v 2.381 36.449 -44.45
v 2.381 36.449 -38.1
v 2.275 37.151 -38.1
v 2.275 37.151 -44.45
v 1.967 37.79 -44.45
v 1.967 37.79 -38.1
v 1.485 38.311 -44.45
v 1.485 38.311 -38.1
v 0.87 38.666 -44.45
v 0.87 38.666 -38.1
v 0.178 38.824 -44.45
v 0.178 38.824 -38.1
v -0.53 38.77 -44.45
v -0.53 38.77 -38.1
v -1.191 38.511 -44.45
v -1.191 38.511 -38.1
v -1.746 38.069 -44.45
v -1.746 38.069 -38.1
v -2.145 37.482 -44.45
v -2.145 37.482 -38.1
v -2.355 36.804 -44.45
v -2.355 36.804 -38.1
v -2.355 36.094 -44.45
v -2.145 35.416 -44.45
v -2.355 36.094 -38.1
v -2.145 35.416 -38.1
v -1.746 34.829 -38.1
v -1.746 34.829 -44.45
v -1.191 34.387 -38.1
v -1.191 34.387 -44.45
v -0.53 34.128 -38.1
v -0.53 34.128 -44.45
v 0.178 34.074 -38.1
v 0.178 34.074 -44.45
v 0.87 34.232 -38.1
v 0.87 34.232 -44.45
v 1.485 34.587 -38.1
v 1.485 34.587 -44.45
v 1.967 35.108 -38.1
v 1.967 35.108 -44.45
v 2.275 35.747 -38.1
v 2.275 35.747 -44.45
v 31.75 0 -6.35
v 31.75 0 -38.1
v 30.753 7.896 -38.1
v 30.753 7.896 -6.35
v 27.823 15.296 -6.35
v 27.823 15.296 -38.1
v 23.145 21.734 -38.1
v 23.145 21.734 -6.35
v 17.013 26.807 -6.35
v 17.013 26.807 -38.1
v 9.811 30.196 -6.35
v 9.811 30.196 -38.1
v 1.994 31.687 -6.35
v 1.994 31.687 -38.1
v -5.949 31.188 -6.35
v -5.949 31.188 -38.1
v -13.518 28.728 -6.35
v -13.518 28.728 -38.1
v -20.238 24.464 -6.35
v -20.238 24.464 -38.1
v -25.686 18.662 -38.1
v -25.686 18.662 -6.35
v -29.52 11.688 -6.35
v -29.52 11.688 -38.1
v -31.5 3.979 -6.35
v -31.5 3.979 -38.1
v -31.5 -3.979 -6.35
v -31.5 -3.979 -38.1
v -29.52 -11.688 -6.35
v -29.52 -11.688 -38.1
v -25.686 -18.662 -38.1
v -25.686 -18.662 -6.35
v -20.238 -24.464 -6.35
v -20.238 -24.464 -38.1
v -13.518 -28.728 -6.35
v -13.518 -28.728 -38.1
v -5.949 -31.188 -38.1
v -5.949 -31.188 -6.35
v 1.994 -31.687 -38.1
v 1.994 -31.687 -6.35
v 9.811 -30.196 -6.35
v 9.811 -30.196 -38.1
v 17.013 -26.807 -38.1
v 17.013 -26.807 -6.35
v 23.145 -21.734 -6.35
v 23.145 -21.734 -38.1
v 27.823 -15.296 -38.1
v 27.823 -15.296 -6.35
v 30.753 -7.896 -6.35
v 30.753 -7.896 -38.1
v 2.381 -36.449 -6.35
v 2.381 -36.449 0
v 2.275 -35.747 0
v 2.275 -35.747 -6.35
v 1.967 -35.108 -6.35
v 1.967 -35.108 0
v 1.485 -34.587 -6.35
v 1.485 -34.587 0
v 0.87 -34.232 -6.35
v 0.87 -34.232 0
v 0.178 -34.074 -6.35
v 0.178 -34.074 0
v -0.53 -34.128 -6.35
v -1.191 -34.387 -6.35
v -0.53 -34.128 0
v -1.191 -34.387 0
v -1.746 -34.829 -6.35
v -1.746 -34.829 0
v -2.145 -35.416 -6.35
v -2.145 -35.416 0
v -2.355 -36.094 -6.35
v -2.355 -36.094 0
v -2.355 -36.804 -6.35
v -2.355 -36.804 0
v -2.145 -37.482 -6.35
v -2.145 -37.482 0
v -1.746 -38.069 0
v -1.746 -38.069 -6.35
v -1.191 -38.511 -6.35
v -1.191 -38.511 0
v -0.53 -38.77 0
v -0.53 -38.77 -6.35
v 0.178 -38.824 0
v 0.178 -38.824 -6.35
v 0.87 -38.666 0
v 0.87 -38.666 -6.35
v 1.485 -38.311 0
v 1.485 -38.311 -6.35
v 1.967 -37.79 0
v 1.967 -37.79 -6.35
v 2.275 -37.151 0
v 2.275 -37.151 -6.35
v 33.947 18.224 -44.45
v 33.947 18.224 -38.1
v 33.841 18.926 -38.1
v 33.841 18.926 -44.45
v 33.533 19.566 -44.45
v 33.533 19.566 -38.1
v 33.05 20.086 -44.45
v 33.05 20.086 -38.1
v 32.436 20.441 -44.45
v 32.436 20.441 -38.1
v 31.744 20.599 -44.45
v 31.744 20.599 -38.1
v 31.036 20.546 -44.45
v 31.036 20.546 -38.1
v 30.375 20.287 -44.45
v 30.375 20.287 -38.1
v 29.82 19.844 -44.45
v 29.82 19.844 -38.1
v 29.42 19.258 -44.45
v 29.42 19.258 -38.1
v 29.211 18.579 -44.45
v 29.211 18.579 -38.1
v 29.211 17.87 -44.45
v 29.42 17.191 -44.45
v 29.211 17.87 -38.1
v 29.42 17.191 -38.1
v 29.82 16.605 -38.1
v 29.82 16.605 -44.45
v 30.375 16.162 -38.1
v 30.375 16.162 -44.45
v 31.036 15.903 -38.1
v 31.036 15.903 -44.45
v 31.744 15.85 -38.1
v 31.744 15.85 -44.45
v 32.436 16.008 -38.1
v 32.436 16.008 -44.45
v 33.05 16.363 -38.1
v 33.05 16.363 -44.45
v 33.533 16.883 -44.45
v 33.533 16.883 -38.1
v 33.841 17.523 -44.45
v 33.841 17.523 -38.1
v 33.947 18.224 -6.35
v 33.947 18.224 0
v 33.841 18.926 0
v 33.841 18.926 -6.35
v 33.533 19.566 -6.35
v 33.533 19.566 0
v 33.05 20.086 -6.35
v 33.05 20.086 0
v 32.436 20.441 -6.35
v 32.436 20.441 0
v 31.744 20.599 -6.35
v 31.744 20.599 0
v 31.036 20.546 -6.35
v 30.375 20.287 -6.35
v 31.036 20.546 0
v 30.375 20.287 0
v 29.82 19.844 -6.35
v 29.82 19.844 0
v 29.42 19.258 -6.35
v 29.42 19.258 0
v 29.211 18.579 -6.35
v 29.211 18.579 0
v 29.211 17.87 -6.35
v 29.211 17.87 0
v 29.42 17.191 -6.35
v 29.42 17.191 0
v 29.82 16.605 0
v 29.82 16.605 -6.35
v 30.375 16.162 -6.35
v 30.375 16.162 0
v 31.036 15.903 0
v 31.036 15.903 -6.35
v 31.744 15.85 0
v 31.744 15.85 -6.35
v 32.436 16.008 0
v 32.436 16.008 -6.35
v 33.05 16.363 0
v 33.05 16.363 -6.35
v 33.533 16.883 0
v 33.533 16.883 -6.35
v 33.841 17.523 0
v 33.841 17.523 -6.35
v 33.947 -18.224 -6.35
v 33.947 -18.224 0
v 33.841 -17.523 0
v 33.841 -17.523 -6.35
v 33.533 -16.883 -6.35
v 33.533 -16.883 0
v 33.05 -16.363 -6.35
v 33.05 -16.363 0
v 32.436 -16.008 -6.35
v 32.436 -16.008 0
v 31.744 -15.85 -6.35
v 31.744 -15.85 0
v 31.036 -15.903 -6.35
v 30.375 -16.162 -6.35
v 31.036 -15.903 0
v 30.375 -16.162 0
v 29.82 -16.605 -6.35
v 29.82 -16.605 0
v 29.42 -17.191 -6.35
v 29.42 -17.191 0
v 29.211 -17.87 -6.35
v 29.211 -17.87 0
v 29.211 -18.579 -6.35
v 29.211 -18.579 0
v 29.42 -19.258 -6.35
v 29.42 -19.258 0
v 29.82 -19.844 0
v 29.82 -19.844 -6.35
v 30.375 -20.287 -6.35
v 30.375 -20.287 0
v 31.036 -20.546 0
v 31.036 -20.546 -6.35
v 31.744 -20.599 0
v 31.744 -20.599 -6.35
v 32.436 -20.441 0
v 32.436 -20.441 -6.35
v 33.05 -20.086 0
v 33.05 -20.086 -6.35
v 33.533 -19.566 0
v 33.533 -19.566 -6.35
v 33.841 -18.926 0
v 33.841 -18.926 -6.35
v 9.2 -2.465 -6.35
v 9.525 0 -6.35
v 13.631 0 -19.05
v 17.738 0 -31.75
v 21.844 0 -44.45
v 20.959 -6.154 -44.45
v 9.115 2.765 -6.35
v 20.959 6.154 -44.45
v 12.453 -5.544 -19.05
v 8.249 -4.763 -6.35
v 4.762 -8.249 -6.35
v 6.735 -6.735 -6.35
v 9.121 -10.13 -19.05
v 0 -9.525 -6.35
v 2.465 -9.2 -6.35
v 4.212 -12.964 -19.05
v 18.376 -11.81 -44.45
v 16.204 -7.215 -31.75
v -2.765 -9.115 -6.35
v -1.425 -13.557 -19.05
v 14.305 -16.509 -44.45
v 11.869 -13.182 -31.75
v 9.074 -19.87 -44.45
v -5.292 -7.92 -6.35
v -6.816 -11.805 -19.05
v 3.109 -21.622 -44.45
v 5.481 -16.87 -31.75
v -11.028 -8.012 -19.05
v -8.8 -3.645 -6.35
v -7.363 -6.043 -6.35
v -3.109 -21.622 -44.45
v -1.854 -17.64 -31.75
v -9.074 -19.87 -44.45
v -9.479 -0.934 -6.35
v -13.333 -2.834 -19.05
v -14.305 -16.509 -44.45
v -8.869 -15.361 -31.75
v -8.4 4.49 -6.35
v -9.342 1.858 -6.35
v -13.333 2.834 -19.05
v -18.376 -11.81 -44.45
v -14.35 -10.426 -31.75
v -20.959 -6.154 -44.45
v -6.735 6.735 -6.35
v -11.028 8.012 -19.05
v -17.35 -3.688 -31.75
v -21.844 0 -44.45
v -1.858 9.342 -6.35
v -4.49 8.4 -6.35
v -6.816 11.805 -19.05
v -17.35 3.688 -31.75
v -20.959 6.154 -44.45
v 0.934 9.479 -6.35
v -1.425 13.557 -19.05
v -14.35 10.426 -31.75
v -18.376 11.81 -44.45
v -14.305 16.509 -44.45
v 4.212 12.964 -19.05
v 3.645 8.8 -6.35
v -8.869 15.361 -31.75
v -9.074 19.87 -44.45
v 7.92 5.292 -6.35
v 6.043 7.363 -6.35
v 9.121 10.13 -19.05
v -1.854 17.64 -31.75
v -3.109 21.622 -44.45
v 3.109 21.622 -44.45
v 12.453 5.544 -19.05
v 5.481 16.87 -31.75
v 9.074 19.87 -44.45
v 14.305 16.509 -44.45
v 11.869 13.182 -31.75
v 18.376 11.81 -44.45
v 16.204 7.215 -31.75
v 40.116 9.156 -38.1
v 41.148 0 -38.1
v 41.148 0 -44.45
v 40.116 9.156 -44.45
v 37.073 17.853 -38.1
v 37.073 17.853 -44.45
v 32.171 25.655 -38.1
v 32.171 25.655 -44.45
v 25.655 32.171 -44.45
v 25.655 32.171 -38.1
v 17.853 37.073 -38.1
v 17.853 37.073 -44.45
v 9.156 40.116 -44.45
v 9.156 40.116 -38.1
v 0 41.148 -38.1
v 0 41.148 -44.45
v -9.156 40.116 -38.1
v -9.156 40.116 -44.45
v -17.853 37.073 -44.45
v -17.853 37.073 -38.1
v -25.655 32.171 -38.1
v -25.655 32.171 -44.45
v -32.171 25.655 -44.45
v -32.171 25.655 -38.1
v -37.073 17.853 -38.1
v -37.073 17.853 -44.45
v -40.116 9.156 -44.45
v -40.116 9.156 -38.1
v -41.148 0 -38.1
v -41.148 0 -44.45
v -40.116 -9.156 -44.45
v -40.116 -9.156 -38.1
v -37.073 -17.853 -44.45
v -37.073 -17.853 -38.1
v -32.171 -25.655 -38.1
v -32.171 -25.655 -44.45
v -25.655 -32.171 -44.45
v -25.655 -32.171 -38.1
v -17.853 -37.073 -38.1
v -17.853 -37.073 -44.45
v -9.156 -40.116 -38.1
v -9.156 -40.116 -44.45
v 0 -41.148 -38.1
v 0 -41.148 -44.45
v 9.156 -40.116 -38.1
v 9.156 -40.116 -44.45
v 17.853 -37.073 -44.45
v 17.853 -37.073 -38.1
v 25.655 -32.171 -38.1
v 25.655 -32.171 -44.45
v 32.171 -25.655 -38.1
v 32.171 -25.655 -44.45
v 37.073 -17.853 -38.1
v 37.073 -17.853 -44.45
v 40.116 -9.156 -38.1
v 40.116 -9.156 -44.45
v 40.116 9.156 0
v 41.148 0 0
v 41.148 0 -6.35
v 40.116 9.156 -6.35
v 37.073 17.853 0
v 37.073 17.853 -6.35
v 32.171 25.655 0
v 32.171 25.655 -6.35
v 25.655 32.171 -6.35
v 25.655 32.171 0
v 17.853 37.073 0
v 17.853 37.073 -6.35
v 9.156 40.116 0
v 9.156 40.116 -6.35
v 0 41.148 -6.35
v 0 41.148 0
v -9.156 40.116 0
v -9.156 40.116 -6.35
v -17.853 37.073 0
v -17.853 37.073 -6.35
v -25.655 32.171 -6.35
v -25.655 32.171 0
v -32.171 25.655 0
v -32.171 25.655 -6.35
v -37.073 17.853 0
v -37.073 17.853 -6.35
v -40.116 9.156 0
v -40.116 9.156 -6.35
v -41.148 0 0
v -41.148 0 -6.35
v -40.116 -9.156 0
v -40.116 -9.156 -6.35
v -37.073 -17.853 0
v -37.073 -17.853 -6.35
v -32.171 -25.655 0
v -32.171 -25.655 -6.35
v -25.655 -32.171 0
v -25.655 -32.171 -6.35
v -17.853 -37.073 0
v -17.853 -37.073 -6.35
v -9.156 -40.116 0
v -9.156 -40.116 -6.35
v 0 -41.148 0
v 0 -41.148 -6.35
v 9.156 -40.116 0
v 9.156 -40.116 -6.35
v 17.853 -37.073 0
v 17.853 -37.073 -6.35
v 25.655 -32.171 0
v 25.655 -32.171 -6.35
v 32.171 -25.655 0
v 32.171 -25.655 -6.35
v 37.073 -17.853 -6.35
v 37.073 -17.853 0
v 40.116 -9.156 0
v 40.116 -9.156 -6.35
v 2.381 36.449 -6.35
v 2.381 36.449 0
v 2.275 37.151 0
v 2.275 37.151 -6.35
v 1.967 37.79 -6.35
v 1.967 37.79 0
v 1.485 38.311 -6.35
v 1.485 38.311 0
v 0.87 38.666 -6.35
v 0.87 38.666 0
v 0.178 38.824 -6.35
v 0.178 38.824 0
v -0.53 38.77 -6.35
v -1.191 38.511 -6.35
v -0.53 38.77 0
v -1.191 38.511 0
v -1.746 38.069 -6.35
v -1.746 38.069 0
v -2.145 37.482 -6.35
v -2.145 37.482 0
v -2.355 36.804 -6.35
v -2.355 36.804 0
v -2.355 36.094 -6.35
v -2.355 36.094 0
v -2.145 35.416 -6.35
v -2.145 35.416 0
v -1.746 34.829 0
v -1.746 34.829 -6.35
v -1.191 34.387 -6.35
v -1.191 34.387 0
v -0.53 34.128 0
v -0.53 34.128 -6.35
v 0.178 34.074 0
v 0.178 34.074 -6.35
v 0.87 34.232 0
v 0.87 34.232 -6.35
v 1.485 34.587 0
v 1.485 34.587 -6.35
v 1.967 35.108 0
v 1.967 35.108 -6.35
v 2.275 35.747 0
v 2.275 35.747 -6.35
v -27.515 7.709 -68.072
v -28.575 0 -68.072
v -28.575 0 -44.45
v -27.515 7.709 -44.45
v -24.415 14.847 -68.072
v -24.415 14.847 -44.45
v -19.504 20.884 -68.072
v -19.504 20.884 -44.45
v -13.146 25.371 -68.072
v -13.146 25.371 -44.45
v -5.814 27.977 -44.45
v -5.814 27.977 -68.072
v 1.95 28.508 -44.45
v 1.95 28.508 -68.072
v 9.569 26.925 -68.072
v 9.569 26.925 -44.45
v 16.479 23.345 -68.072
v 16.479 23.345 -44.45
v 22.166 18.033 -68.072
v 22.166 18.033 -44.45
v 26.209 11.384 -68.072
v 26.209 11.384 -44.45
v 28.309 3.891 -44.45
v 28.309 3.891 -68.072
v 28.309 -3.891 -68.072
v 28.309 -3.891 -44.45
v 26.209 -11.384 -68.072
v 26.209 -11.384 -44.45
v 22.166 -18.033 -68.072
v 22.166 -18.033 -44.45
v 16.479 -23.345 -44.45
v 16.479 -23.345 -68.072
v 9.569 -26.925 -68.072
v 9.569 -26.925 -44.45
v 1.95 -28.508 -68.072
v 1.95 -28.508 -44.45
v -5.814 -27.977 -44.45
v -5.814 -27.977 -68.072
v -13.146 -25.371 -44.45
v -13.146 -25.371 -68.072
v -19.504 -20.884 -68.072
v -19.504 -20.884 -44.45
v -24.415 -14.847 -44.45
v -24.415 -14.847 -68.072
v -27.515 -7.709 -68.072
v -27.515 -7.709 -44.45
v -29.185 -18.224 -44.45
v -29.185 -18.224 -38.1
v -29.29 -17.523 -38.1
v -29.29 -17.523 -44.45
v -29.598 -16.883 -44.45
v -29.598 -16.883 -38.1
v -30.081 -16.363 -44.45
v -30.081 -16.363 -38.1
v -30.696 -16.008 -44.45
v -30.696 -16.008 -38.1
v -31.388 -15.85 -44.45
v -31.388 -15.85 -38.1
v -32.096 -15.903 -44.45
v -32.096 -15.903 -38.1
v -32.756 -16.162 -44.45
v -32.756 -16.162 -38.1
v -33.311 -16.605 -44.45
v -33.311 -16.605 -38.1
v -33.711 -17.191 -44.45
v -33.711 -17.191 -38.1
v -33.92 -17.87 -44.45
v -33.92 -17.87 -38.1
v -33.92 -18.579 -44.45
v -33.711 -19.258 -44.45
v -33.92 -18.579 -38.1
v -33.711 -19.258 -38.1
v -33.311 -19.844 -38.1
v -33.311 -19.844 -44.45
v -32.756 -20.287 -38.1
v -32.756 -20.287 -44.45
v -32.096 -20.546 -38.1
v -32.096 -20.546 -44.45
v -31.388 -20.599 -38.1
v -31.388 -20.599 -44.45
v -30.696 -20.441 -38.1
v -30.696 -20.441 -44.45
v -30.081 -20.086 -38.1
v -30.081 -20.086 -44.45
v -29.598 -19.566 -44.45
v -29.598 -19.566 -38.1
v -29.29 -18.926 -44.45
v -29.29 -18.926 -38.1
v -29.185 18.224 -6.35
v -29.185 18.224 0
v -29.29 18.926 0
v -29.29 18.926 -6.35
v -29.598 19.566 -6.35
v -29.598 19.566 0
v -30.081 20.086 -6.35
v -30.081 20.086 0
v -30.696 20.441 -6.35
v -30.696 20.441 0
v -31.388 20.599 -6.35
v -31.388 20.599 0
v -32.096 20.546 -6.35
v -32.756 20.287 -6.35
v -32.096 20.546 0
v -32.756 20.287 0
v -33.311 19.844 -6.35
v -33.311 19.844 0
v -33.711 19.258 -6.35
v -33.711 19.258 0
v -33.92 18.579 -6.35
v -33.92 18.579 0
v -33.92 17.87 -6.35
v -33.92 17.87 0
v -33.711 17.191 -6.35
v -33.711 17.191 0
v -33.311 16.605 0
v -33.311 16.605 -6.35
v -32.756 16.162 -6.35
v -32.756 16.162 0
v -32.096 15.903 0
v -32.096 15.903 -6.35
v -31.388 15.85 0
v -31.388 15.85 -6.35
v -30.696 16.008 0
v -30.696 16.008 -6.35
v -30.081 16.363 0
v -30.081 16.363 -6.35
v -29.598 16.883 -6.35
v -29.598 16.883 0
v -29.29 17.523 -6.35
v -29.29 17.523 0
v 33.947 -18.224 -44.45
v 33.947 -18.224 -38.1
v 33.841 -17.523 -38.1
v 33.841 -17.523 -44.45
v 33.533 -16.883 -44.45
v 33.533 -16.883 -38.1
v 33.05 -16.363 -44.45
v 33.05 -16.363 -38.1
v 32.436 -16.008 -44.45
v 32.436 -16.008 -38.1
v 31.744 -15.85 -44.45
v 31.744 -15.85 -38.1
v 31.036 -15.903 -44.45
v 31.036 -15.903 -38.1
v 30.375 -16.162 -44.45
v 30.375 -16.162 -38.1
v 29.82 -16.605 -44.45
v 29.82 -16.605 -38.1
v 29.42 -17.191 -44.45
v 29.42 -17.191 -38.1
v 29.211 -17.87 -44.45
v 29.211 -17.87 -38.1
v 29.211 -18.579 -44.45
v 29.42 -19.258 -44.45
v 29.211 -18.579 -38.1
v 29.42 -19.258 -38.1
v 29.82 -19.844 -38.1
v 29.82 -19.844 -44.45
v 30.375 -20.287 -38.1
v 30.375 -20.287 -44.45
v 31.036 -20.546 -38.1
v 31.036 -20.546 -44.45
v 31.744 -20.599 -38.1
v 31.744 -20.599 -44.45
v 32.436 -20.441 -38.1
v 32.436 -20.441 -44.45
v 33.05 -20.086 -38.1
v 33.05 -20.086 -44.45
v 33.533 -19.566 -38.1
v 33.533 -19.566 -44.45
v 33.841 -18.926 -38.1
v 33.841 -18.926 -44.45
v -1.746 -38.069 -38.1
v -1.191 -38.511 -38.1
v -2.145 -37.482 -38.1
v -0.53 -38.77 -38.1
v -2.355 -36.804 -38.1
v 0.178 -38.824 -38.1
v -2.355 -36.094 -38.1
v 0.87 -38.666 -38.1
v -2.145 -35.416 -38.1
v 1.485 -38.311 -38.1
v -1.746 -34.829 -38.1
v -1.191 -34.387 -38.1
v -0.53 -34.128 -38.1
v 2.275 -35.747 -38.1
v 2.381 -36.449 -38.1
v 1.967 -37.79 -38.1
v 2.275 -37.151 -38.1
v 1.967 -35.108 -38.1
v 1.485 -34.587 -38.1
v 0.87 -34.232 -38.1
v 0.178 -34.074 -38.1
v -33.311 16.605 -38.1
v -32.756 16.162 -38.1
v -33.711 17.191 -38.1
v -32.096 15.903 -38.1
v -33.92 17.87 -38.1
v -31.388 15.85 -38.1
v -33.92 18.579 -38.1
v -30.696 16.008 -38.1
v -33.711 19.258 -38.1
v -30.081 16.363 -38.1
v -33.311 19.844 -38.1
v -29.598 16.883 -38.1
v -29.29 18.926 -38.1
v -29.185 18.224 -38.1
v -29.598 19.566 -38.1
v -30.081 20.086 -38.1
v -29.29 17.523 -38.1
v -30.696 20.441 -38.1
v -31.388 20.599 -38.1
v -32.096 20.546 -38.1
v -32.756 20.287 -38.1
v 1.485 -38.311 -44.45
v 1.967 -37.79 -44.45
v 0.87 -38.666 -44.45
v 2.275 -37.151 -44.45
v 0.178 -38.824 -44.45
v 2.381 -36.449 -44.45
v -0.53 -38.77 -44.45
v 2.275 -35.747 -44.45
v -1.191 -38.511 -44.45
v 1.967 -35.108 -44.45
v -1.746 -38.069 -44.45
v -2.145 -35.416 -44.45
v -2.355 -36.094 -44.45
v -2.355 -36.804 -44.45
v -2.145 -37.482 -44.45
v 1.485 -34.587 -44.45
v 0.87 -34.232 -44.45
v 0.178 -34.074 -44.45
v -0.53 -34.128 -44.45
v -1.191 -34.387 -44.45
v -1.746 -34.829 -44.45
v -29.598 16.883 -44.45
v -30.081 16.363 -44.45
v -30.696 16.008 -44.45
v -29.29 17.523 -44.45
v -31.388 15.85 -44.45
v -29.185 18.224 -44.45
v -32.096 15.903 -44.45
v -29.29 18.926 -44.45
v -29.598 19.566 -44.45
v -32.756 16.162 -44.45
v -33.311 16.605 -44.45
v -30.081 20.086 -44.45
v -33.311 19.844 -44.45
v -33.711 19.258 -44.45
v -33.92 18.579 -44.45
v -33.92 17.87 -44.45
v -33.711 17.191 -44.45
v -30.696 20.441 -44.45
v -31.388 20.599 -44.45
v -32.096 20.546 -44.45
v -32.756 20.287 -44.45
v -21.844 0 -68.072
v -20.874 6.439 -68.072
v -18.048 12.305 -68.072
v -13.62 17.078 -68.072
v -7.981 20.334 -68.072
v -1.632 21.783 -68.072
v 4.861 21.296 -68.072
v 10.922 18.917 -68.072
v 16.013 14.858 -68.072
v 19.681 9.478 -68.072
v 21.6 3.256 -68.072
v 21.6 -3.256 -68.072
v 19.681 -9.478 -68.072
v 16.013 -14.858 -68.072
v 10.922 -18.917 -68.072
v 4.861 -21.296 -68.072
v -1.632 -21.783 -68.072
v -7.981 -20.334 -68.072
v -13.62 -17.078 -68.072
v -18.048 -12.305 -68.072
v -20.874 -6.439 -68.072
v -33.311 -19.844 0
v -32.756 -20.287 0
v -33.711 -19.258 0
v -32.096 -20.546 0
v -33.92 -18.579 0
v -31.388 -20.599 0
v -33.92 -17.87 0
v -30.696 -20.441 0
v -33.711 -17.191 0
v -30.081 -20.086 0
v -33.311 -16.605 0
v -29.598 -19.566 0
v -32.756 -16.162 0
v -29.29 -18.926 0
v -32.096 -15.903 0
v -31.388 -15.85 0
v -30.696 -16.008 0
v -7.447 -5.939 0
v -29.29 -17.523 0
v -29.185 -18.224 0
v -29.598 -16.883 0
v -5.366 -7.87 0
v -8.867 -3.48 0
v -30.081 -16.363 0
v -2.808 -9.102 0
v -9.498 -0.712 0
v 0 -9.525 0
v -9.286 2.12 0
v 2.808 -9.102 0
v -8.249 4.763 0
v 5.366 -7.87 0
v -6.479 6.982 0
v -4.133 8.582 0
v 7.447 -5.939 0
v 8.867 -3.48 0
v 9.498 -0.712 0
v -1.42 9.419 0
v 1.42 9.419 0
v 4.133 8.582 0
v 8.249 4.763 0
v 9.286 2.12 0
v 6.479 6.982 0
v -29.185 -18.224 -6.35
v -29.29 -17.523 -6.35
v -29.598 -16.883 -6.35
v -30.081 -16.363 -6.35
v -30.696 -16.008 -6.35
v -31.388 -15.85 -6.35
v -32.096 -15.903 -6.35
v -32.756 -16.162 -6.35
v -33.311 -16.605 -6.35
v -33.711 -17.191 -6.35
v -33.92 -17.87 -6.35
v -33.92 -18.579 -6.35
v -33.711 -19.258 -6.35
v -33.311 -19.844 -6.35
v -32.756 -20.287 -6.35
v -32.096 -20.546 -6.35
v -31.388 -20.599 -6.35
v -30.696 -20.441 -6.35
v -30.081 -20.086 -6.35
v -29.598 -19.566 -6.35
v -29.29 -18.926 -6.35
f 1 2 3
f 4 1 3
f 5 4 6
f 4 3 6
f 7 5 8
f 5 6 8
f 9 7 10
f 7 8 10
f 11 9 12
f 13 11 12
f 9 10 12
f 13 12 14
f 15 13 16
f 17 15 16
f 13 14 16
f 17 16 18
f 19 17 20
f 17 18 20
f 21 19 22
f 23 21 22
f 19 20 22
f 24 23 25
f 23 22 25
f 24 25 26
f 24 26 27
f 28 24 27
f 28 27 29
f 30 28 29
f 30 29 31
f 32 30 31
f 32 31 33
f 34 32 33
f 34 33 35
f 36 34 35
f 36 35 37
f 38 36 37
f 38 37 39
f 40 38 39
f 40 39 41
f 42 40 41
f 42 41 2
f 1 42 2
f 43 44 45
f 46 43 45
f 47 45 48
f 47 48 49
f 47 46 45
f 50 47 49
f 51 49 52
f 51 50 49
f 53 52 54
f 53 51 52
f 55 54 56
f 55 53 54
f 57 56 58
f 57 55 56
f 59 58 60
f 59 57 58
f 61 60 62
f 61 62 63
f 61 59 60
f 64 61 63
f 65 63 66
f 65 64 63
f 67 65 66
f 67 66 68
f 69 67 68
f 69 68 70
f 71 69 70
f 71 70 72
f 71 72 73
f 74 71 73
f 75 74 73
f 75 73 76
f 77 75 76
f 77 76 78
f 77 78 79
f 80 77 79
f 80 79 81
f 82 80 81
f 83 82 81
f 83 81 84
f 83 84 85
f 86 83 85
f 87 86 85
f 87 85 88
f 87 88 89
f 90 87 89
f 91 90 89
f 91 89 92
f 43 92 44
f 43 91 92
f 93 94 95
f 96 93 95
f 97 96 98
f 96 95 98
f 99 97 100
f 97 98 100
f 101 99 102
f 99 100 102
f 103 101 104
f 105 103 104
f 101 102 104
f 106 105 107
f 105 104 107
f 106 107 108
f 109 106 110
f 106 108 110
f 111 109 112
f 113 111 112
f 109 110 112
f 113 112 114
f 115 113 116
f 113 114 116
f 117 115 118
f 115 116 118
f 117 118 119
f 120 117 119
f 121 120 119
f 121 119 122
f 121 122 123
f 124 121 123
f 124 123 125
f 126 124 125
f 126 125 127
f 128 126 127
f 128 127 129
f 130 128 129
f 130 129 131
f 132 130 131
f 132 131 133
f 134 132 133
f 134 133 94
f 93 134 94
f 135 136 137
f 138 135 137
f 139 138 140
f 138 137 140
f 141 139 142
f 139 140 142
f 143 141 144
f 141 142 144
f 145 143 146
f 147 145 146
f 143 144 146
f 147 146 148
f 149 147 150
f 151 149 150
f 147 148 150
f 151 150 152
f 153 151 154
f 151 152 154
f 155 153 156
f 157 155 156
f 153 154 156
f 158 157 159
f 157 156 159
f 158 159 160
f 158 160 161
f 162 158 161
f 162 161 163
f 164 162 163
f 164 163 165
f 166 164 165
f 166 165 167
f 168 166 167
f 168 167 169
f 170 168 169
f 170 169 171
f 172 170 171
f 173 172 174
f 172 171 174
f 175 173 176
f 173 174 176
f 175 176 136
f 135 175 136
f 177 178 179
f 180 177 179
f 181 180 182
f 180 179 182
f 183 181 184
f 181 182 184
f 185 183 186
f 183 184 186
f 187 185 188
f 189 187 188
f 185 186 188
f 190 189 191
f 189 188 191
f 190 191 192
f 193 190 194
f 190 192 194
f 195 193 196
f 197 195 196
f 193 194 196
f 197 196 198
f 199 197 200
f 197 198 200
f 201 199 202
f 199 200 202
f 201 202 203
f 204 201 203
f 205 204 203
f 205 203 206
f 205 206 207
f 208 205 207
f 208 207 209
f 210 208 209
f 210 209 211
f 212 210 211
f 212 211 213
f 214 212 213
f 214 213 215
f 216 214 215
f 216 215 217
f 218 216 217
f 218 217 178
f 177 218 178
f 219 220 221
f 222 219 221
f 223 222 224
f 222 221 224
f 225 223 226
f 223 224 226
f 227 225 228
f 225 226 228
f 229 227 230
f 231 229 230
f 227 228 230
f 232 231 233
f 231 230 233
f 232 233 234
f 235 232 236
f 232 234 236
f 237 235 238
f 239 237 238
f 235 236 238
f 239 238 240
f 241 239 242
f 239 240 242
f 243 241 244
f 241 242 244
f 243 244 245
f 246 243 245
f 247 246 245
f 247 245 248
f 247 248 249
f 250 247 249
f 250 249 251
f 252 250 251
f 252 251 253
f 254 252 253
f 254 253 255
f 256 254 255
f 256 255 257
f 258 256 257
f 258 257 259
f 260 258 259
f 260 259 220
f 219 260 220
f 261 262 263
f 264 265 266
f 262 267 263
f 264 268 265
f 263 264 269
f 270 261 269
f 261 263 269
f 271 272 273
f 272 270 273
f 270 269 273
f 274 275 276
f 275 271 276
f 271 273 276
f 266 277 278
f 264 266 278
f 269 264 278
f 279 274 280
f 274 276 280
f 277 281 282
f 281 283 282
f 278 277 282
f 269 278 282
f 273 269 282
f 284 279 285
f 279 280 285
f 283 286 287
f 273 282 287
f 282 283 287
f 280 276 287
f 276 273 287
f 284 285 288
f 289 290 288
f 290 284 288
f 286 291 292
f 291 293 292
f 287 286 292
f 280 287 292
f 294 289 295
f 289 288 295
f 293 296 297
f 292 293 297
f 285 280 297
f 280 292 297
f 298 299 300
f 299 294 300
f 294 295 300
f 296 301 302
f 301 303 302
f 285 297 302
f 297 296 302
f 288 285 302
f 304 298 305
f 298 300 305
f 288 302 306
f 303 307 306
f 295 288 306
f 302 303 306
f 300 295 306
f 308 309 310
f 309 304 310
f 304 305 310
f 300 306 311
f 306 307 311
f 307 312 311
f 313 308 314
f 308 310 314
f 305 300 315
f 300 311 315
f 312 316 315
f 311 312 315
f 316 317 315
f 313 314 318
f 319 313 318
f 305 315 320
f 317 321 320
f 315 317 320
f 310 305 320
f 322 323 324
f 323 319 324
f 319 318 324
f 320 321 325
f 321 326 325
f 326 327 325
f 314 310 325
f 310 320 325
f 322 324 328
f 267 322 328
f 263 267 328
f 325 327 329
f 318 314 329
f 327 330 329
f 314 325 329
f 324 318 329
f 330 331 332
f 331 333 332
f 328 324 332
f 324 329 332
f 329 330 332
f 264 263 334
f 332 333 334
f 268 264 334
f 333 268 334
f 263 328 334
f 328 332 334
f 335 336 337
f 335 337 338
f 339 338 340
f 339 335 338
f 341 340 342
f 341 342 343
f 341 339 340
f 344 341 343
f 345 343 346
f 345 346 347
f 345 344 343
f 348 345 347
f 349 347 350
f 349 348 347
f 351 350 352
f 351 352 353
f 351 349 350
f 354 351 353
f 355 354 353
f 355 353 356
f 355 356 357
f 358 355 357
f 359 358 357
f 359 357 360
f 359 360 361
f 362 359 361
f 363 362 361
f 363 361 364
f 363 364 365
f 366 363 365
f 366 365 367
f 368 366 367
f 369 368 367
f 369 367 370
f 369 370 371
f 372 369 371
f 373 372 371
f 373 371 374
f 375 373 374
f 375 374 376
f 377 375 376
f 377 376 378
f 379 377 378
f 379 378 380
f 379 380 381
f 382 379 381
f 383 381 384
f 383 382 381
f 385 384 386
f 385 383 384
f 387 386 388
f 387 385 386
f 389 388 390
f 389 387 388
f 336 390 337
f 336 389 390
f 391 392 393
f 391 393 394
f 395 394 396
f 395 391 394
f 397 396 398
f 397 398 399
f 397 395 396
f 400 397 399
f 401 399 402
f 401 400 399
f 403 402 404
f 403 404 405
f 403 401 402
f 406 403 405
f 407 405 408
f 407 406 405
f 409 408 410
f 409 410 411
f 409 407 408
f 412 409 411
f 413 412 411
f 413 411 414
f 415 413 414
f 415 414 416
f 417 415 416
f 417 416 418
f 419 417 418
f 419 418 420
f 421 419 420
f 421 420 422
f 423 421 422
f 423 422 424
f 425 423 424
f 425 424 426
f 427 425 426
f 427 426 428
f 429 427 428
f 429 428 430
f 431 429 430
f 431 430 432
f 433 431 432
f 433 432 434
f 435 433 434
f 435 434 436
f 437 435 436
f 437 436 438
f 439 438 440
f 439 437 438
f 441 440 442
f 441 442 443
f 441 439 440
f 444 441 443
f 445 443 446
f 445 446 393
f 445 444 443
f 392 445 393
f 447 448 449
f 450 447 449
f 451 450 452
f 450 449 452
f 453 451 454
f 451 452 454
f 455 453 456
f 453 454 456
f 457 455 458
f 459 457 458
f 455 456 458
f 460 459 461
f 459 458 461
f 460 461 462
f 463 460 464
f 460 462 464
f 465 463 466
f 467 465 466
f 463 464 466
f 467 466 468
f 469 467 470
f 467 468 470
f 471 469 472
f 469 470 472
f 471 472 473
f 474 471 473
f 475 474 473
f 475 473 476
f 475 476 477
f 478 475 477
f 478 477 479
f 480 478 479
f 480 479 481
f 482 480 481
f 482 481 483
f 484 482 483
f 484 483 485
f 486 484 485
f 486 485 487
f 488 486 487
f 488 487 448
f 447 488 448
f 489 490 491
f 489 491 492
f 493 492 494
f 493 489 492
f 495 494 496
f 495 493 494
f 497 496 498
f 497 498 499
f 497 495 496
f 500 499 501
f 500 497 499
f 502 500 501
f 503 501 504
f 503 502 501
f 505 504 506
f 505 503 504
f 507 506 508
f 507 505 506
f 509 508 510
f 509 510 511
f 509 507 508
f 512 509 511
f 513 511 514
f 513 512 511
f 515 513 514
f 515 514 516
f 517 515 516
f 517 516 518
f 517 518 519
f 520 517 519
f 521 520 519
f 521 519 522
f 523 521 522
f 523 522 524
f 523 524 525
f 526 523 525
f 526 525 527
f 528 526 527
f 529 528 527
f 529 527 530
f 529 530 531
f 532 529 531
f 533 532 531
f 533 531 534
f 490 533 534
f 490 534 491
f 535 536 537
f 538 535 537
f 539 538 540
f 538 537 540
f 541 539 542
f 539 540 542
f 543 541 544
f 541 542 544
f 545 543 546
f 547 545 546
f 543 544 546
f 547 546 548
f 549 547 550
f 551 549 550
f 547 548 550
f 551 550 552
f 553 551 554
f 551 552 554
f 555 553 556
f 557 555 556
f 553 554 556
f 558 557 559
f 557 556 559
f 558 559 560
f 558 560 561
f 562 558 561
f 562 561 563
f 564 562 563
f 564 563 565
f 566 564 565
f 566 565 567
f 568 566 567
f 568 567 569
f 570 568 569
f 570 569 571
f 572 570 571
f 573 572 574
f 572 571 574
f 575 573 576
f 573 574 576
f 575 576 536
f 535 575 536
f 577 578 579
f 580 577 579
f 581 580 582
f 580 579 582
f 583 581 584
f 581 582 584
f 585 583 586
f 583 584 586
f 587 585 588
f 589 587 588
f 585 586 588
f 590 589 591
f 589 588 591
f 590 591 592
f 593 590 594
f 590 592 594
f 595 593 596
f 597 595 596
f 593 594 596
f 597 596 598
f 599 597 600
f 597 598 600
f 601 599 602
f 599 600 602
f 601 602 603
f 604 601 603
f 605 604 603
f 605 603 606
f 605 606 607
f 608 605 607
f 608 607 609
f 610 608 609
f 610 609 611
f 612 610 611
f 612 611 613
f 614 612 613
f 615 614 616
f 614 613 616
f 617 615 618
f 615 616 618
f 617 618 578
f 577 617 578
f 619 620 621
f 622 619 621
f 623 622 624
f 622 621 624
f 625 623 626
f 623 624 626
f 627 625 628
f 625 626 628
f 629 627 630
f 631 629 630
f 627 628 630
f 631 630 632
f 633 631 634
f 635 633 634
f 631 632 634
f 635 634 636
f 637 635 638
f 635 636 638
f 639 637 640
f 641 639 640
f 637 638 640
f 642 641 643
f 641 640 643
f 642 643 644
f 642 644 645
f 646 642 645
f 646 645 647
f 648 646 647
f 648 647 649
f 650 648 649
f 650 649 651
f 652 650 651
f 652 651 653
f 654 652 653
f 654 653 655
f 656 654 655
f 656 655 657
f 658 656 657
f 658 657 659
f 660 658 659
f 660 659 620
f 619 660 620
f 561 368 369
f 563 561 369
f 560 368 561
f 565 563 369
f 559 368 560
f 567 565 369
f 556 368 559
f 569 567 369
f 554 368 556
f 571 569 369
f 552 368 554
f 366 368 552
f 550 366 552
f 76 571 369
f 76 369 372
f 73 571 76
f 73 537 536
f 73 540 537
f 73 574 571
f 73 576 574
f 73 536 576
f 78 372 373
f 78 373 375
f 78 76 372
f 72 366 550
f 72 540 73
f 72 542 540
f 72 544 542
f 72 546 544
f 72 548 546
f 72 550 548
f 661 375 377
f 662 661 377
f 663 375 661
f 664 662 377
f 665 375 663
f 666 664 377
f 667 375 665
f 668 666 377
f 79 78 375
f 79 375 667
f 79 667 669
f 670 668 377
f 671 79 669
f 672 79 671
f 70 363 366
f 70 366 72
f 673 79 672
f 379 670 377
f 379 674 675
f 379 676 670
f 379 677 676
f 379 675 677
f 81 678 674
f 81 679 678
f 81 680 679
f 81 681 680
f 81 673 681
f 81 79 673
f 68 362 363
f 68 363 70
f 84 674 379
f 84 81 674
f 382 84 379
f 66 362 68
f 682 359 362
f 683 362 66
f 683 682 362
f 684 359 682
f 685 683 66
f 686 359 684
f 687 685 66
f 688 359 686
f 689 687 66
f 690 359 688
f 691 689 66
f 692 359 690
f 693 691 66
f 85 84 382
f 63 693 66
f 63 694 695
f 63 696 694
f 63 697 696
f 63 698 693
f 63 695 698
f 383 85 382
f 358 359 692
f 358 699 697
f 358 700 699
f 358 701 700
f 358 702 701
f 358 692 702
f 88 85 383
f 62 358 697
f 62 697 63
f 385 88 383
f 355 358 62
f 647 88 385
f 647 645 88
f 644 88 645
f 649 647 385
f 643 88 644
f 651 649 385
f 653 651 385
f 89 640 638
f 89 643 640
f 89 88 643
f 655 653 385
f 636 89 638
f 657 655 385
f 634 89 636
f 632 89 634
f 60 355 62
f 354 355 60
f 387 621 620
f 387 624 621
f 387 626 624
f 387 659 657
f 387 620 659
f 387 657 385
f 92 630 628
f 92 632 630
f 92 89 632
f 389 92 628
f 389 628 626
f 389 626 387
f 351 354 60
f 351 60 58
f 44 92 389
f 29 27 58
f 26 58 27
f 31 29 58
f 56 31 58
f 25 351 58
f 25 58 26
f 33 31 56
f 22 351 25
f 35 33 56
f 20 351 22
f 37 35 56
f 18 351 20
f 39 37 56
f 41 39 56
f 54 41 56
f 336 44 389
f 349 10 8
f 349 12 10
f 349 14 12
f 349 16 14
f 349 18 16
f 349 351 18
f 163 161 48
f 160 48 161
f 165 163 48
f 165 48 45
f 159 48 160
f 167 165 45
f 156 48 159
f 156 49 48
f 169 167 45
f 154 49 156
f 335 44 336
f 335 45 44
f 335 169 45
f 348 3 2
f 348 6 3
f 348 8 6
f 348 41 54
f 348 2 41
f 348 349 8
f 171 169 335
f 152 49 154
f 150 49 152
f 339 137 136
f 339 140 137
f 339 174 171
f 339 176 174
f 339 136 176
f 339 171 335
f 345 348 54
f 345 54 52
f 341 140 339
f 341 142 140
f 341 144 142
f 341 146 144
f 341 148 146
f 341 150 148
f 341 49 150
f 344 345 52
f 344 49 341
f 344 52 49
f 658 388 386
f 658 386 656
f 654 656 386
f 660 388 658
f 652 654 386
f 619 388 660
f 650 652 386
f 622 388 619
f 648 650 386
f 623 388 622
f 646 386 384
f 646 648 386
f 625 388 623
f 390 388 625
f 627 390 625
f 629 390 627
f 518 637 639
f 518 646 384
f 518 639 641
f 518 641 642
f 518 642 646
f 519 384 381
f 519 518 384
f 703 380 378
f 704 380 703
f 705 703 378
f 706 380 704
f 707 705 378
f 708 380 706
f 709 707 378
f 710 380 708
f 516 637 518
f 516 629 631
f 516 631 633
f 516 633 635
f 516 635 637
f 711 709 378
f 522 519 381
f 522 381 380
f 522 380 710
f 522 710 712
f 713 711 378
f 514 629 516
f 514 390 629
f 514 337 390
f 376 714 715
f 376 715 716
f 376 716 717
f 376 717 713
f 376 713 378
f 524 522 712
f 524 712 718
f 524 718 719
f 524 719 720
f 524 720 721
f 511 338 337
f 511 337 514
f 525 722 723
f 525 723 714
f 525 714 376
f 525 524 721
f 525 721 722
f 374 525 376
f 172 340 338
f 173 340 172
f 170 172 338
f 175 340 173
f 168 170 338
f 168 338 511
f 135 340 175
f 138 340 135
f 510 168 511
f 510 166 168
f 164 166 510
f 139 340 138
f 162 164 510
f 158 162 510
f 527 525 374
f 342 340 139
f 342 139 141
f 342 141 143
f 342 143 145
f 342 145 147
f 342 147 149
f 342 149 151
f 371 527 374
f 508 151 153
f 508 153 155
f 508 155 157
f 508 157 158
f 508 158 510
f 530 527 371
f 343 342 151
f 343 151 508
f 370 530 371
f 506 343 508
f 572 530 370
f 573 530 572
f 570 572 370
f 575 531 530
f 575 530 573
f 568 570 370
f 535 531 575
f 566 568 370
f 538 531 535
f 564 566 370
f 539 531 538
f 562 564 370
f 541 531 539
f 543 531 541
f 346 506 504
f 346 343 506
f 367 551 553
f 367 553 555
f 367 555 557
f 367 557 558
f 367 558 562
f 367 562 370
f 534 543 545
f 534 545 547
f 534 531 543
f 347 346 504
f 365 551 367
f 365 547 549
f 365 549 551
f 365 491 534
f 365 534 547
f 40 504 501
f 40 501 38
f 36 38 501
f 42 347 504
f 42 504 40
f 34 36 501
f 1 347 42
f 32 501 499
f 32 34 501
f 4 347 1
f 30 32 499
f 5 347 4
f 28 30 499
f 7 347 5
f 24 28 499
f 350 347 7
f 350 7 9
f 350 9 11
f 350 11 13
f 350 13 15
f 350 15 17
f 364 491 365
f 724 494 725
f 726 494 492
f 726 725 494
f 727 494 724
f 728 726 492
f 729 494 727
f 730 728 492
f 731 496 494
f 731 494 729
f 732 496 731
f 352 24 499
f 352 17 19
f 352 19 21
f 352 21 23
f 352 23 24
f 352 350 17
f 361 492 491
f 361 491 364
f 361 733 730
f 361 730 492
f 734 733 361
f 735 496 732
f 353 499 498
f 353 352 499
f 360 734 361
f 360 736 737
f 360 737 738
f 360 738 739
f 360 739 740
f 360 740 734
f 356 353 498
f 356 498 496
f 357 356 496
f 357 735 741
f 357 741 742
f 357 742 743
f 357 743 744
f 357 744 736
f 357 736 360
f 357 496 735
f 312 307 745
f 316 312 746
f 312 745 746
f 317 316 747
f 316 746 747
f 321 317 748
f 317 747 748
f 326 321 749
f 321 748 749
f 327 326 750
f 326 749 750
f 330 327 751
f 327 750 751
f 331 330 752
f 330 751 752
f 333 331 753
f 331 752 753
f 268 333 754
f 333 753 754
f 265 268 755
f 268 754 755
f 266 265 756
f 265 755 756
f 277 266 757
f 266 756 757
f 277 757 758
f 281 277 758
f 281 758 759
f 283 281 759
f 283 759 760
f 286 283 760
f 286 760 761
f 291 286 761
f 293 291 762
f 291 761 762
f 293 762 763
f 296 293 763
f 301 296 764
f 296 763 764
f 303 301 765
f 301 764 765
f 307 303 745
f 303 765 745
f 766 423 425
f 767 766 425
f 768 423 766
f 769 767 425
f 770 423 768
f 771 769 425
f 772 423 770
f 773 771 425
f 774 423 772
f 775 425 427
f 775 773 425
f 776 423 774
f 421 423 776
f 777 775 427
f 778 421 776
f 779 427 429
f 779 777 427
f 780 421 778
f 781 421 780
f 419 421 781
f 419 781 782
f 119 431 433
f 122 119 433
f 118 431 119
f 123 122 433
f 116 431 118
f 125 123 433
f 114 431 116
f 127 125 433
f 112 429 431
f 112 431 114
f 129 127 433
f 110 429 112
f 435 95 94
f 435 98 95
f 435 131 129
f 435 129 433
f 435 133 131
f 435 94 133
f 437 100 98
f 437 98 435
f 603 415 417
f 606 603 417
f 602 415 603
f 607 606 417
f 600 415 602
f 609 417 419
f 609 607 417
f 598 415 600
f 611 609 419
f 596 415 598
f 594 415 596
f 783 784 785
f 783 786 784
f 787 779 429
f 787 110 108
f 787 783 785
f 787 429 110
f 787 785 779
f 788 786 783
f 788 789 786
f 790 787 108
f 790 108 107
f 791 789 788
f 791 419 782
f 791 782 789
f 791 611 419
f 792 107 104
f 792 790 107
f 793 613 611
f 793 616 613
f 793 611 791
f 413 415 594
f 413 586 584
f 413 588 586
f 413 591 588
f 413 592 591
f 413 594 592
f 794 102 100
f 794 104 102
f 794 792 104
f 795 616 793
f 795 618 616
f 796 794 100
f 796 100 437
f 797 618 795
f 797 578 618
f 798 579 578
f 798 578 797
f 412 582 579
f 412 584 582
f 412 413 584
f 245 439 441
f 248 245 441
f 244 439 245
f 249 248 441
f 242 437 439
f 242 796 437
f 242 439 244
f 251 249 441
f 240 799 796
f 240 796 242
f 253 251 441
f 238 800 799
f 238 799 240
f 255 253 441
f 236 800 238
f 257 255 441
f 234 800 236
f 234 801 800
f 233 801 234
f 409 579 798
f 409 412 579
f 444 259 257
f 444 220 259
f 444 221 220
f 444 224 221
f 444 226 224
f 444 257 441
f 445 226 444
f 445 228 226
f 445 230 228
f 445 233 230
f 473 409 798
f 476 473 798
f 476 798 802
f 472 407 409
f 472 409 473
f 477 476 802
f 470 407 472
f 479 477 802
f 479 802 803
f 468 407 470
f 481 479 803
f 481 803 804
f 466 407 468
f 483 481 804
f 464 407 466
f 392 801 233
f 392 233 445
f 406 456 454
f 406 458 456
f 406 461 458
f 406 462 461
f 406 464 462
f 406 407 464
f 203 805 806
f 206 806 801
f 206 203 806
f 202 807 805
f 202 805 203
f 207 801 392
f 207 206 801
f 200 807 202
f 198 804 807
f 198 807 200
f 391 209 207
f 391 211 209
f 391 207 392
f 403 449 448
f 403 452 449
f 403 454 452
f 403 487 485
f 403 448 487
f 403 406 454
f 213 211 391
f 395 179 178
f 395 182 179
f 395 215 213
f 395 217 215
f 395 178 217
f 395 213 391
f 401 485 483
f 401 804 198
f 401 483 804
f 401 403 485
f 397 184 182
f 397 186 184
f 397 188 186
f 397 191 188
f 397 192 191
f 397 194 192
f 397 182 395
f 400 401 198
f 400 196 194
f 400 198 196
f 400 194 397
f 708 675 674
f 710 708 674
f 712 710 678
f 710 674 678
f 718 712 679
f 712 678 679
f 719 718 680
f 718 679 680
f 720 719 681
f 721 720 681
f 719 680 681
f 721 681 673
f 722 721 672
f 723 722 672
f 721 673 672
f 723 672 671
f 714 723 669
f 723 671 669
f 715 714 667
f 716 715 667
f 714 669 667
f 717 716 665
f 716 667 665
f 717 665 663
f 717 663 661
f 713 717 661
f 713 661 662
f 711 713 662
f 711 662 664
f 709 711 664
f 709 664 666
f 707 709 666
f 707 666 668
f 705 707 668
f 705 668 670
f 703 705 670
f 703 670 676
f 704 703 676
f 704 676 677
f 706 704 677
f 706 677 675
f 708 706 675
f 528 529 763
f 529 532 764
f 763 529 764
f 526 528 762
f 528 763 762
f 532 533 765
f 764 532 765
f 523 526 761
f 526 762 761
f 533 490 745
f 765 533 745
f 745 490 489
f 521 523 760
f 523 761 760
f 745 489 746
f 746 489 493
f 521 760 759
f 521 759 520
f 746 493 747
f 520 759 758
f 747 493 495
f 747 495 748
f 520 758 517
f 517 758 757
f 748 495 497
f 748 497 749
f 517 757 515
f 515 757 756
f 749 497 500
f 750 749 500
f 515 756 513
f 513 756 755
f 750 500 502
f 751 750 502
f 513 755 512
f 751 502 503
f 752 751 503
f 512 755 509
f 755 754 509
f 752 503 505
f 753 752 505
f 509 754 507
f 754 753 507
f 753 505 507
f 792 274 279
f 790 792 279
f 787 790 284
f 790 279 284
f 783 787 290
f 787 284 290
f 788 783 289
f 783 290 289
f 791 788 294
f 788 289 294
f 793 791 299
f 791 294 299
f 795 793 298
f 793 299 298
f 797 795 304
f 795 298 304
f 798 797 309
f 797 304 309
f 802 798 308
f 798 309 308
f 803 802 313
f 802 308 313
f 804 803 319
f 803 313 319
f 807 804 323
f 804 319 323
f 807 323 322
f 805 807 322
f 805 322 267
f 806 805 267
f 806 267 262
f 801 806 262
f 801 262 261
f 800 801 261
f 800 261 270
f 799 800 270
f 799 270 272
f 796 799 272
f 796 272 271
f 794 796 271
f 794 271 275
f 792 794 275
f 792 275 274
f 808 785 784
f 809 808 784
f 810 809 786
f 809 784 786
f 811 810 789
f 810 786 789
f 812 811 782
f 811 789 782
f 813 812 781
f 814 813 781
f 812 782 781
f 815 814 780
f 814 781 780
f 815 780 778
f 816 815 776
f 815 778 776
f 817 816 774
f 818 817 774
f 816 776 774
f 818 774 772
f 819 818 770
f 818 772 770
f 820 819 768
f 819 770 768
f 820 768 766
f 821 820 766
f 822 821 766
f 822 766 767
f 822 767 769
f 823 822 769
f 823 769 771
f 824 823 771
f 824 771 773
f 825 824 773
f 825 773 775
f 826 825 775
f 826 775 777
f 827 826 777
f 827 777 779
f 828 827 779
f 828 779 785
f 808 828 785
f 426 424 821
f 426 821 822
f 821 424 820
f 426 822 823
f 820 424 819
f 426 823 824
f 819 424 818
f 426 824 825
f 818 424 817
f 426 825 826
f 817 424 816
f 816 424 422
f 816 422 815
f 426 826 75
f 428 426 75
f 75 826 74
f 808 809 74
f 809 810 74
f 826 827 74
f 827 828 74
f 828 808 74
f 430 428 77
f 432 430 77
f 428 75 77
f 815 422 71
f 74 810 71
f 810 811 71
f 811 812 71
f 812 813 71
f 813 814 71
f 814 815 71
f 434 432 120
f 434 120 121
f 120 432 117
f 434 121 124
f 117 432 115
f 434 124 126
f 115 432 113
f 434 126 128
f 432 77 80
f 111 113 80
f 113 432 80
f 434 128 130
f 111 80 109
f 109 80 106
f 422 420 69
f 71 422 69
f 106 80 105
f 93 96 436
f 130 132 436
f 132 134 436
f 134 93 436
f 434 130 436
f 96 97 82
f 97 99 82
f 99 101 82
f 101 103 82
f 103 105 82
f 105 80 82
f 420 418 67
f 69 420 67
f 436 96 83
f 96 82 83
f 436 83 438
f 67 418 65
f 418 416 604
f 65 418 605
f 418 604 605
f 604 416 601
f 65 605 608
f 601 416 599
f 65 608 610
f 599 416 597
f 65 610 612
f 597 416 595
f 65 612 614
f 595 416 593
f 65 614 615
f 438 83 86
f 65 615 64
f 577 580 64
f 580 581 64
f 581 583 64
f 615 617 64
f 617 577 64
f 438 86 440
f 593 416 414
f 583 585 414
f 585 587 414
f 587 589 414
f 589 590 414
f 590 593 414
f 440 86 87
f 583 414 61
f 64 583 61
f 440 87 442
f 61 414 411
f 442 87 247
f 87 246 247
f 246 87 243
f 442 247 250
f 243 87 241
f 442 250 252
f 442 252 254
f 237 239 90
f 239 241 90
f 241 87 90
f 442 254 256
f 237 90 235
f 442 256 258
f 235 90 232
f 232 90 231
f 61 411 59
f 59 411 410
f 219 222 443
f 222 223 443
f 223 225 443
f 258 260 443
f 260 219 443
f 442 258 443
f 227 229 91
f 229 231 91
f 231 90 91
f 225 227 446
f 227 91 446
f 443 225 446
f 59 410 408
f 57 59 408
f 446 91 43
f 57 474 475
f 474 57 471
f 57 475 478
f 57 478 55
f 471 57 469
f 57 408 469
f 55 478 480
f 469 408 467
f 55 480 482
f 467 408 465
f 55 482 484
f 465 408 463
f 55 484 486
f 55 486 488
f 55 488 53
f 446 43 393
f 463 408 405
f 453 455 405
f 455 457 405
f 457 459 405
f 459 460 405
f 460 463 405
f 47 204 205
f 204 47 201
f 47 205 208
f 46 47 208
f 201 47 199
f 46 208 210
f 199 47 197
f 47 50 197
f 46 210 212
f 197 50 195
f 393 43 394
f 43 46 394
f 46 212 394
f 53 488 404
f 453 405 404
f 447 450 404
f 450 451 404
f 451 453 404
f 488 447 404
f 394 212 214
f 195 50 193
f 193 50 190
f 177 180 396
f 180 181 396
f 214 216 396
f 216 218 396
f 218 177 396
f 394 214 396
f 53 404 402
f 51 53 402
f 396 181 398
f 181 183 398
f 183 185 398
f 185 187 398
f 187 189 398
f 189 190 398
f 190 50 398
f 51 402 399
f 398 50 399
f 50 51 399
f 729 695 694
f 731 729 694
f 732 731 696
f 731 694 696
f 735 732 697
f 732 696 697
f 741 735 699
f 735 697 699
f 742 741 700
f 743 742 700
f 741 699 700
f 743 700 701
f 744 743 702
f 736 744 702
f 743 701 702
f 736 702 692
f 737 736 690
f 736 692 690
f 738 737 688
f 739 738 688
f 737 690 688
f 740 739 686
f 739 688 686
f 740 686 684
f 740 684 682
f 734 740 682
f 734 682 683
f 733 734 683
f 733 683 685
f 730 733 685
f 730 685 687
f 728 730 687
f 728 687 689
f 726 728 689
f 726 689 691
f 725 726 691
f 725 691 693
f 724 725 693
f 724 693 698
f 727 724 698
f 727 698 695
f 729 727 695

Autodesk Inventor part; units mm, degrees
ref_plane "YZ Plane" through (0, 0, 0) normal (1, 0, 0) x (0, 1, 0)
ref_plane "XZ Plane" through (0, 0, 0) normal (0, 1, 0) x (-1, 0, 0)
ref_plane "XY Plane" through (0, 0, 0) normal (0, 0, 1) x (1, 0, 0)
sketch "Sketch1" plane through (0, 0, 0) normal (0, 0, 1) x (1, 0, 0)
  circle A0 centre (0, 0) radius 41.148
  dimension "d0" = 82.296
extrude "Extrusion1" add sketch "Sketch1" against normal blind 68.072
sketch "Sketch2" plane through (0, 0, 0) normal (0, 0, 1) x (1, 0, 0)
  circle A0 centre (0, 0) radius 9.525
  dimension "d3" = 19.05
extrude "Extrusion2" cut sketch "Sketch2" against normal blind 68.072
sketch "Sketch3" plane through (0, 0, -68.072) normal (0, 0, -1) x (-1, 0, 0)
  circle A0 centre (0, 0) radius 21.844
  dimension "d6" = 43.688
extrude "Extrusion3" cut sketch "Sketch3" against normal blind 23.622
sketch "Sketch4" plane through (0, 0, 0) normal (0, 0, 1) x (1, 0, 0)
  circle A0 centre (0, 0) radius 9.525
extrude "Extrusion4" add sketch "Sketch4" against normal blind 6.35
loft "Loft1" cut section 1 edges at (-9.525, 0, -6.35) section 2 edges at (21.844, 0, -44.45)
sketch "Sketch5" plane through (0, 0, 0) normal (0, 0, 1) x (1, 0, 0)
  point P0 (0, 0)
hole "Hole1" at (0, 0, 0) direction (0, 0, -1) diameter 19.05 depth 50.419 tip angle 118
sketch "Sketch6" plane through (0, 0, 0) normal (0, 0, 1) x (1, 0, 0)
  circle A0 centre (0, 0) radius 41.148
  circle A1 centre (0, 0) radius 31.75
  dimension "d22" = 63.5
sketch "Sketch7" plane through (0, 0, -68.072) normal (0, 0, -1) x (-1, 0, 0)
  circle A0 centre (0, 0) radius 41.148
  circle A1 centre (0, 0) radius 9.525 projected
  circle A2 centre (0, 0) radius 28.575
  dimension "d23" = 57.15
extrude "Extrusion5" cut sketch "Sketch7" against normal blind 23.622 contours A0
extrude "Extrusion6" cut sketch "Sketch6" against normal blind 38.1
sketch "Sketch8" plane through (0, 0, 0) normal (0, 0, 1) x (1, 0, 0)
  circle A0 centre (0, 0) radius 31.75
  circle A1 centre (0, 0) radius 41.148
extrude "Extrusion7" add sketch "Sketch8" against normal blind 6.35
sketch "Sketch9" plane through (0, 0, 0) normal (0, 0, 1) x (1, 0, 0)
  circle A0 centre (0, 36.449) radius 2.3812
  circle A1 centre (31.5658, 18.2245) radius 2.3812
  circle A2 centre (31.5658, -18.2245) radius 2.3812
  circle A3 centre (0, -36.449) radius 2.3812
  circle A4 centre (-31.5658, -18.2245) radius 2.3812
  circle A5 centre (-31.5658, 18.2245) radius 2.3812
  point P0 (0, 0)
  dimension "d30" = 4.7625
  dimension "d33" = 360
extrude "Extrusion8" cut sketch "Sketch9" against normal blind 127
properties part number "PreCombChamber4_4"
